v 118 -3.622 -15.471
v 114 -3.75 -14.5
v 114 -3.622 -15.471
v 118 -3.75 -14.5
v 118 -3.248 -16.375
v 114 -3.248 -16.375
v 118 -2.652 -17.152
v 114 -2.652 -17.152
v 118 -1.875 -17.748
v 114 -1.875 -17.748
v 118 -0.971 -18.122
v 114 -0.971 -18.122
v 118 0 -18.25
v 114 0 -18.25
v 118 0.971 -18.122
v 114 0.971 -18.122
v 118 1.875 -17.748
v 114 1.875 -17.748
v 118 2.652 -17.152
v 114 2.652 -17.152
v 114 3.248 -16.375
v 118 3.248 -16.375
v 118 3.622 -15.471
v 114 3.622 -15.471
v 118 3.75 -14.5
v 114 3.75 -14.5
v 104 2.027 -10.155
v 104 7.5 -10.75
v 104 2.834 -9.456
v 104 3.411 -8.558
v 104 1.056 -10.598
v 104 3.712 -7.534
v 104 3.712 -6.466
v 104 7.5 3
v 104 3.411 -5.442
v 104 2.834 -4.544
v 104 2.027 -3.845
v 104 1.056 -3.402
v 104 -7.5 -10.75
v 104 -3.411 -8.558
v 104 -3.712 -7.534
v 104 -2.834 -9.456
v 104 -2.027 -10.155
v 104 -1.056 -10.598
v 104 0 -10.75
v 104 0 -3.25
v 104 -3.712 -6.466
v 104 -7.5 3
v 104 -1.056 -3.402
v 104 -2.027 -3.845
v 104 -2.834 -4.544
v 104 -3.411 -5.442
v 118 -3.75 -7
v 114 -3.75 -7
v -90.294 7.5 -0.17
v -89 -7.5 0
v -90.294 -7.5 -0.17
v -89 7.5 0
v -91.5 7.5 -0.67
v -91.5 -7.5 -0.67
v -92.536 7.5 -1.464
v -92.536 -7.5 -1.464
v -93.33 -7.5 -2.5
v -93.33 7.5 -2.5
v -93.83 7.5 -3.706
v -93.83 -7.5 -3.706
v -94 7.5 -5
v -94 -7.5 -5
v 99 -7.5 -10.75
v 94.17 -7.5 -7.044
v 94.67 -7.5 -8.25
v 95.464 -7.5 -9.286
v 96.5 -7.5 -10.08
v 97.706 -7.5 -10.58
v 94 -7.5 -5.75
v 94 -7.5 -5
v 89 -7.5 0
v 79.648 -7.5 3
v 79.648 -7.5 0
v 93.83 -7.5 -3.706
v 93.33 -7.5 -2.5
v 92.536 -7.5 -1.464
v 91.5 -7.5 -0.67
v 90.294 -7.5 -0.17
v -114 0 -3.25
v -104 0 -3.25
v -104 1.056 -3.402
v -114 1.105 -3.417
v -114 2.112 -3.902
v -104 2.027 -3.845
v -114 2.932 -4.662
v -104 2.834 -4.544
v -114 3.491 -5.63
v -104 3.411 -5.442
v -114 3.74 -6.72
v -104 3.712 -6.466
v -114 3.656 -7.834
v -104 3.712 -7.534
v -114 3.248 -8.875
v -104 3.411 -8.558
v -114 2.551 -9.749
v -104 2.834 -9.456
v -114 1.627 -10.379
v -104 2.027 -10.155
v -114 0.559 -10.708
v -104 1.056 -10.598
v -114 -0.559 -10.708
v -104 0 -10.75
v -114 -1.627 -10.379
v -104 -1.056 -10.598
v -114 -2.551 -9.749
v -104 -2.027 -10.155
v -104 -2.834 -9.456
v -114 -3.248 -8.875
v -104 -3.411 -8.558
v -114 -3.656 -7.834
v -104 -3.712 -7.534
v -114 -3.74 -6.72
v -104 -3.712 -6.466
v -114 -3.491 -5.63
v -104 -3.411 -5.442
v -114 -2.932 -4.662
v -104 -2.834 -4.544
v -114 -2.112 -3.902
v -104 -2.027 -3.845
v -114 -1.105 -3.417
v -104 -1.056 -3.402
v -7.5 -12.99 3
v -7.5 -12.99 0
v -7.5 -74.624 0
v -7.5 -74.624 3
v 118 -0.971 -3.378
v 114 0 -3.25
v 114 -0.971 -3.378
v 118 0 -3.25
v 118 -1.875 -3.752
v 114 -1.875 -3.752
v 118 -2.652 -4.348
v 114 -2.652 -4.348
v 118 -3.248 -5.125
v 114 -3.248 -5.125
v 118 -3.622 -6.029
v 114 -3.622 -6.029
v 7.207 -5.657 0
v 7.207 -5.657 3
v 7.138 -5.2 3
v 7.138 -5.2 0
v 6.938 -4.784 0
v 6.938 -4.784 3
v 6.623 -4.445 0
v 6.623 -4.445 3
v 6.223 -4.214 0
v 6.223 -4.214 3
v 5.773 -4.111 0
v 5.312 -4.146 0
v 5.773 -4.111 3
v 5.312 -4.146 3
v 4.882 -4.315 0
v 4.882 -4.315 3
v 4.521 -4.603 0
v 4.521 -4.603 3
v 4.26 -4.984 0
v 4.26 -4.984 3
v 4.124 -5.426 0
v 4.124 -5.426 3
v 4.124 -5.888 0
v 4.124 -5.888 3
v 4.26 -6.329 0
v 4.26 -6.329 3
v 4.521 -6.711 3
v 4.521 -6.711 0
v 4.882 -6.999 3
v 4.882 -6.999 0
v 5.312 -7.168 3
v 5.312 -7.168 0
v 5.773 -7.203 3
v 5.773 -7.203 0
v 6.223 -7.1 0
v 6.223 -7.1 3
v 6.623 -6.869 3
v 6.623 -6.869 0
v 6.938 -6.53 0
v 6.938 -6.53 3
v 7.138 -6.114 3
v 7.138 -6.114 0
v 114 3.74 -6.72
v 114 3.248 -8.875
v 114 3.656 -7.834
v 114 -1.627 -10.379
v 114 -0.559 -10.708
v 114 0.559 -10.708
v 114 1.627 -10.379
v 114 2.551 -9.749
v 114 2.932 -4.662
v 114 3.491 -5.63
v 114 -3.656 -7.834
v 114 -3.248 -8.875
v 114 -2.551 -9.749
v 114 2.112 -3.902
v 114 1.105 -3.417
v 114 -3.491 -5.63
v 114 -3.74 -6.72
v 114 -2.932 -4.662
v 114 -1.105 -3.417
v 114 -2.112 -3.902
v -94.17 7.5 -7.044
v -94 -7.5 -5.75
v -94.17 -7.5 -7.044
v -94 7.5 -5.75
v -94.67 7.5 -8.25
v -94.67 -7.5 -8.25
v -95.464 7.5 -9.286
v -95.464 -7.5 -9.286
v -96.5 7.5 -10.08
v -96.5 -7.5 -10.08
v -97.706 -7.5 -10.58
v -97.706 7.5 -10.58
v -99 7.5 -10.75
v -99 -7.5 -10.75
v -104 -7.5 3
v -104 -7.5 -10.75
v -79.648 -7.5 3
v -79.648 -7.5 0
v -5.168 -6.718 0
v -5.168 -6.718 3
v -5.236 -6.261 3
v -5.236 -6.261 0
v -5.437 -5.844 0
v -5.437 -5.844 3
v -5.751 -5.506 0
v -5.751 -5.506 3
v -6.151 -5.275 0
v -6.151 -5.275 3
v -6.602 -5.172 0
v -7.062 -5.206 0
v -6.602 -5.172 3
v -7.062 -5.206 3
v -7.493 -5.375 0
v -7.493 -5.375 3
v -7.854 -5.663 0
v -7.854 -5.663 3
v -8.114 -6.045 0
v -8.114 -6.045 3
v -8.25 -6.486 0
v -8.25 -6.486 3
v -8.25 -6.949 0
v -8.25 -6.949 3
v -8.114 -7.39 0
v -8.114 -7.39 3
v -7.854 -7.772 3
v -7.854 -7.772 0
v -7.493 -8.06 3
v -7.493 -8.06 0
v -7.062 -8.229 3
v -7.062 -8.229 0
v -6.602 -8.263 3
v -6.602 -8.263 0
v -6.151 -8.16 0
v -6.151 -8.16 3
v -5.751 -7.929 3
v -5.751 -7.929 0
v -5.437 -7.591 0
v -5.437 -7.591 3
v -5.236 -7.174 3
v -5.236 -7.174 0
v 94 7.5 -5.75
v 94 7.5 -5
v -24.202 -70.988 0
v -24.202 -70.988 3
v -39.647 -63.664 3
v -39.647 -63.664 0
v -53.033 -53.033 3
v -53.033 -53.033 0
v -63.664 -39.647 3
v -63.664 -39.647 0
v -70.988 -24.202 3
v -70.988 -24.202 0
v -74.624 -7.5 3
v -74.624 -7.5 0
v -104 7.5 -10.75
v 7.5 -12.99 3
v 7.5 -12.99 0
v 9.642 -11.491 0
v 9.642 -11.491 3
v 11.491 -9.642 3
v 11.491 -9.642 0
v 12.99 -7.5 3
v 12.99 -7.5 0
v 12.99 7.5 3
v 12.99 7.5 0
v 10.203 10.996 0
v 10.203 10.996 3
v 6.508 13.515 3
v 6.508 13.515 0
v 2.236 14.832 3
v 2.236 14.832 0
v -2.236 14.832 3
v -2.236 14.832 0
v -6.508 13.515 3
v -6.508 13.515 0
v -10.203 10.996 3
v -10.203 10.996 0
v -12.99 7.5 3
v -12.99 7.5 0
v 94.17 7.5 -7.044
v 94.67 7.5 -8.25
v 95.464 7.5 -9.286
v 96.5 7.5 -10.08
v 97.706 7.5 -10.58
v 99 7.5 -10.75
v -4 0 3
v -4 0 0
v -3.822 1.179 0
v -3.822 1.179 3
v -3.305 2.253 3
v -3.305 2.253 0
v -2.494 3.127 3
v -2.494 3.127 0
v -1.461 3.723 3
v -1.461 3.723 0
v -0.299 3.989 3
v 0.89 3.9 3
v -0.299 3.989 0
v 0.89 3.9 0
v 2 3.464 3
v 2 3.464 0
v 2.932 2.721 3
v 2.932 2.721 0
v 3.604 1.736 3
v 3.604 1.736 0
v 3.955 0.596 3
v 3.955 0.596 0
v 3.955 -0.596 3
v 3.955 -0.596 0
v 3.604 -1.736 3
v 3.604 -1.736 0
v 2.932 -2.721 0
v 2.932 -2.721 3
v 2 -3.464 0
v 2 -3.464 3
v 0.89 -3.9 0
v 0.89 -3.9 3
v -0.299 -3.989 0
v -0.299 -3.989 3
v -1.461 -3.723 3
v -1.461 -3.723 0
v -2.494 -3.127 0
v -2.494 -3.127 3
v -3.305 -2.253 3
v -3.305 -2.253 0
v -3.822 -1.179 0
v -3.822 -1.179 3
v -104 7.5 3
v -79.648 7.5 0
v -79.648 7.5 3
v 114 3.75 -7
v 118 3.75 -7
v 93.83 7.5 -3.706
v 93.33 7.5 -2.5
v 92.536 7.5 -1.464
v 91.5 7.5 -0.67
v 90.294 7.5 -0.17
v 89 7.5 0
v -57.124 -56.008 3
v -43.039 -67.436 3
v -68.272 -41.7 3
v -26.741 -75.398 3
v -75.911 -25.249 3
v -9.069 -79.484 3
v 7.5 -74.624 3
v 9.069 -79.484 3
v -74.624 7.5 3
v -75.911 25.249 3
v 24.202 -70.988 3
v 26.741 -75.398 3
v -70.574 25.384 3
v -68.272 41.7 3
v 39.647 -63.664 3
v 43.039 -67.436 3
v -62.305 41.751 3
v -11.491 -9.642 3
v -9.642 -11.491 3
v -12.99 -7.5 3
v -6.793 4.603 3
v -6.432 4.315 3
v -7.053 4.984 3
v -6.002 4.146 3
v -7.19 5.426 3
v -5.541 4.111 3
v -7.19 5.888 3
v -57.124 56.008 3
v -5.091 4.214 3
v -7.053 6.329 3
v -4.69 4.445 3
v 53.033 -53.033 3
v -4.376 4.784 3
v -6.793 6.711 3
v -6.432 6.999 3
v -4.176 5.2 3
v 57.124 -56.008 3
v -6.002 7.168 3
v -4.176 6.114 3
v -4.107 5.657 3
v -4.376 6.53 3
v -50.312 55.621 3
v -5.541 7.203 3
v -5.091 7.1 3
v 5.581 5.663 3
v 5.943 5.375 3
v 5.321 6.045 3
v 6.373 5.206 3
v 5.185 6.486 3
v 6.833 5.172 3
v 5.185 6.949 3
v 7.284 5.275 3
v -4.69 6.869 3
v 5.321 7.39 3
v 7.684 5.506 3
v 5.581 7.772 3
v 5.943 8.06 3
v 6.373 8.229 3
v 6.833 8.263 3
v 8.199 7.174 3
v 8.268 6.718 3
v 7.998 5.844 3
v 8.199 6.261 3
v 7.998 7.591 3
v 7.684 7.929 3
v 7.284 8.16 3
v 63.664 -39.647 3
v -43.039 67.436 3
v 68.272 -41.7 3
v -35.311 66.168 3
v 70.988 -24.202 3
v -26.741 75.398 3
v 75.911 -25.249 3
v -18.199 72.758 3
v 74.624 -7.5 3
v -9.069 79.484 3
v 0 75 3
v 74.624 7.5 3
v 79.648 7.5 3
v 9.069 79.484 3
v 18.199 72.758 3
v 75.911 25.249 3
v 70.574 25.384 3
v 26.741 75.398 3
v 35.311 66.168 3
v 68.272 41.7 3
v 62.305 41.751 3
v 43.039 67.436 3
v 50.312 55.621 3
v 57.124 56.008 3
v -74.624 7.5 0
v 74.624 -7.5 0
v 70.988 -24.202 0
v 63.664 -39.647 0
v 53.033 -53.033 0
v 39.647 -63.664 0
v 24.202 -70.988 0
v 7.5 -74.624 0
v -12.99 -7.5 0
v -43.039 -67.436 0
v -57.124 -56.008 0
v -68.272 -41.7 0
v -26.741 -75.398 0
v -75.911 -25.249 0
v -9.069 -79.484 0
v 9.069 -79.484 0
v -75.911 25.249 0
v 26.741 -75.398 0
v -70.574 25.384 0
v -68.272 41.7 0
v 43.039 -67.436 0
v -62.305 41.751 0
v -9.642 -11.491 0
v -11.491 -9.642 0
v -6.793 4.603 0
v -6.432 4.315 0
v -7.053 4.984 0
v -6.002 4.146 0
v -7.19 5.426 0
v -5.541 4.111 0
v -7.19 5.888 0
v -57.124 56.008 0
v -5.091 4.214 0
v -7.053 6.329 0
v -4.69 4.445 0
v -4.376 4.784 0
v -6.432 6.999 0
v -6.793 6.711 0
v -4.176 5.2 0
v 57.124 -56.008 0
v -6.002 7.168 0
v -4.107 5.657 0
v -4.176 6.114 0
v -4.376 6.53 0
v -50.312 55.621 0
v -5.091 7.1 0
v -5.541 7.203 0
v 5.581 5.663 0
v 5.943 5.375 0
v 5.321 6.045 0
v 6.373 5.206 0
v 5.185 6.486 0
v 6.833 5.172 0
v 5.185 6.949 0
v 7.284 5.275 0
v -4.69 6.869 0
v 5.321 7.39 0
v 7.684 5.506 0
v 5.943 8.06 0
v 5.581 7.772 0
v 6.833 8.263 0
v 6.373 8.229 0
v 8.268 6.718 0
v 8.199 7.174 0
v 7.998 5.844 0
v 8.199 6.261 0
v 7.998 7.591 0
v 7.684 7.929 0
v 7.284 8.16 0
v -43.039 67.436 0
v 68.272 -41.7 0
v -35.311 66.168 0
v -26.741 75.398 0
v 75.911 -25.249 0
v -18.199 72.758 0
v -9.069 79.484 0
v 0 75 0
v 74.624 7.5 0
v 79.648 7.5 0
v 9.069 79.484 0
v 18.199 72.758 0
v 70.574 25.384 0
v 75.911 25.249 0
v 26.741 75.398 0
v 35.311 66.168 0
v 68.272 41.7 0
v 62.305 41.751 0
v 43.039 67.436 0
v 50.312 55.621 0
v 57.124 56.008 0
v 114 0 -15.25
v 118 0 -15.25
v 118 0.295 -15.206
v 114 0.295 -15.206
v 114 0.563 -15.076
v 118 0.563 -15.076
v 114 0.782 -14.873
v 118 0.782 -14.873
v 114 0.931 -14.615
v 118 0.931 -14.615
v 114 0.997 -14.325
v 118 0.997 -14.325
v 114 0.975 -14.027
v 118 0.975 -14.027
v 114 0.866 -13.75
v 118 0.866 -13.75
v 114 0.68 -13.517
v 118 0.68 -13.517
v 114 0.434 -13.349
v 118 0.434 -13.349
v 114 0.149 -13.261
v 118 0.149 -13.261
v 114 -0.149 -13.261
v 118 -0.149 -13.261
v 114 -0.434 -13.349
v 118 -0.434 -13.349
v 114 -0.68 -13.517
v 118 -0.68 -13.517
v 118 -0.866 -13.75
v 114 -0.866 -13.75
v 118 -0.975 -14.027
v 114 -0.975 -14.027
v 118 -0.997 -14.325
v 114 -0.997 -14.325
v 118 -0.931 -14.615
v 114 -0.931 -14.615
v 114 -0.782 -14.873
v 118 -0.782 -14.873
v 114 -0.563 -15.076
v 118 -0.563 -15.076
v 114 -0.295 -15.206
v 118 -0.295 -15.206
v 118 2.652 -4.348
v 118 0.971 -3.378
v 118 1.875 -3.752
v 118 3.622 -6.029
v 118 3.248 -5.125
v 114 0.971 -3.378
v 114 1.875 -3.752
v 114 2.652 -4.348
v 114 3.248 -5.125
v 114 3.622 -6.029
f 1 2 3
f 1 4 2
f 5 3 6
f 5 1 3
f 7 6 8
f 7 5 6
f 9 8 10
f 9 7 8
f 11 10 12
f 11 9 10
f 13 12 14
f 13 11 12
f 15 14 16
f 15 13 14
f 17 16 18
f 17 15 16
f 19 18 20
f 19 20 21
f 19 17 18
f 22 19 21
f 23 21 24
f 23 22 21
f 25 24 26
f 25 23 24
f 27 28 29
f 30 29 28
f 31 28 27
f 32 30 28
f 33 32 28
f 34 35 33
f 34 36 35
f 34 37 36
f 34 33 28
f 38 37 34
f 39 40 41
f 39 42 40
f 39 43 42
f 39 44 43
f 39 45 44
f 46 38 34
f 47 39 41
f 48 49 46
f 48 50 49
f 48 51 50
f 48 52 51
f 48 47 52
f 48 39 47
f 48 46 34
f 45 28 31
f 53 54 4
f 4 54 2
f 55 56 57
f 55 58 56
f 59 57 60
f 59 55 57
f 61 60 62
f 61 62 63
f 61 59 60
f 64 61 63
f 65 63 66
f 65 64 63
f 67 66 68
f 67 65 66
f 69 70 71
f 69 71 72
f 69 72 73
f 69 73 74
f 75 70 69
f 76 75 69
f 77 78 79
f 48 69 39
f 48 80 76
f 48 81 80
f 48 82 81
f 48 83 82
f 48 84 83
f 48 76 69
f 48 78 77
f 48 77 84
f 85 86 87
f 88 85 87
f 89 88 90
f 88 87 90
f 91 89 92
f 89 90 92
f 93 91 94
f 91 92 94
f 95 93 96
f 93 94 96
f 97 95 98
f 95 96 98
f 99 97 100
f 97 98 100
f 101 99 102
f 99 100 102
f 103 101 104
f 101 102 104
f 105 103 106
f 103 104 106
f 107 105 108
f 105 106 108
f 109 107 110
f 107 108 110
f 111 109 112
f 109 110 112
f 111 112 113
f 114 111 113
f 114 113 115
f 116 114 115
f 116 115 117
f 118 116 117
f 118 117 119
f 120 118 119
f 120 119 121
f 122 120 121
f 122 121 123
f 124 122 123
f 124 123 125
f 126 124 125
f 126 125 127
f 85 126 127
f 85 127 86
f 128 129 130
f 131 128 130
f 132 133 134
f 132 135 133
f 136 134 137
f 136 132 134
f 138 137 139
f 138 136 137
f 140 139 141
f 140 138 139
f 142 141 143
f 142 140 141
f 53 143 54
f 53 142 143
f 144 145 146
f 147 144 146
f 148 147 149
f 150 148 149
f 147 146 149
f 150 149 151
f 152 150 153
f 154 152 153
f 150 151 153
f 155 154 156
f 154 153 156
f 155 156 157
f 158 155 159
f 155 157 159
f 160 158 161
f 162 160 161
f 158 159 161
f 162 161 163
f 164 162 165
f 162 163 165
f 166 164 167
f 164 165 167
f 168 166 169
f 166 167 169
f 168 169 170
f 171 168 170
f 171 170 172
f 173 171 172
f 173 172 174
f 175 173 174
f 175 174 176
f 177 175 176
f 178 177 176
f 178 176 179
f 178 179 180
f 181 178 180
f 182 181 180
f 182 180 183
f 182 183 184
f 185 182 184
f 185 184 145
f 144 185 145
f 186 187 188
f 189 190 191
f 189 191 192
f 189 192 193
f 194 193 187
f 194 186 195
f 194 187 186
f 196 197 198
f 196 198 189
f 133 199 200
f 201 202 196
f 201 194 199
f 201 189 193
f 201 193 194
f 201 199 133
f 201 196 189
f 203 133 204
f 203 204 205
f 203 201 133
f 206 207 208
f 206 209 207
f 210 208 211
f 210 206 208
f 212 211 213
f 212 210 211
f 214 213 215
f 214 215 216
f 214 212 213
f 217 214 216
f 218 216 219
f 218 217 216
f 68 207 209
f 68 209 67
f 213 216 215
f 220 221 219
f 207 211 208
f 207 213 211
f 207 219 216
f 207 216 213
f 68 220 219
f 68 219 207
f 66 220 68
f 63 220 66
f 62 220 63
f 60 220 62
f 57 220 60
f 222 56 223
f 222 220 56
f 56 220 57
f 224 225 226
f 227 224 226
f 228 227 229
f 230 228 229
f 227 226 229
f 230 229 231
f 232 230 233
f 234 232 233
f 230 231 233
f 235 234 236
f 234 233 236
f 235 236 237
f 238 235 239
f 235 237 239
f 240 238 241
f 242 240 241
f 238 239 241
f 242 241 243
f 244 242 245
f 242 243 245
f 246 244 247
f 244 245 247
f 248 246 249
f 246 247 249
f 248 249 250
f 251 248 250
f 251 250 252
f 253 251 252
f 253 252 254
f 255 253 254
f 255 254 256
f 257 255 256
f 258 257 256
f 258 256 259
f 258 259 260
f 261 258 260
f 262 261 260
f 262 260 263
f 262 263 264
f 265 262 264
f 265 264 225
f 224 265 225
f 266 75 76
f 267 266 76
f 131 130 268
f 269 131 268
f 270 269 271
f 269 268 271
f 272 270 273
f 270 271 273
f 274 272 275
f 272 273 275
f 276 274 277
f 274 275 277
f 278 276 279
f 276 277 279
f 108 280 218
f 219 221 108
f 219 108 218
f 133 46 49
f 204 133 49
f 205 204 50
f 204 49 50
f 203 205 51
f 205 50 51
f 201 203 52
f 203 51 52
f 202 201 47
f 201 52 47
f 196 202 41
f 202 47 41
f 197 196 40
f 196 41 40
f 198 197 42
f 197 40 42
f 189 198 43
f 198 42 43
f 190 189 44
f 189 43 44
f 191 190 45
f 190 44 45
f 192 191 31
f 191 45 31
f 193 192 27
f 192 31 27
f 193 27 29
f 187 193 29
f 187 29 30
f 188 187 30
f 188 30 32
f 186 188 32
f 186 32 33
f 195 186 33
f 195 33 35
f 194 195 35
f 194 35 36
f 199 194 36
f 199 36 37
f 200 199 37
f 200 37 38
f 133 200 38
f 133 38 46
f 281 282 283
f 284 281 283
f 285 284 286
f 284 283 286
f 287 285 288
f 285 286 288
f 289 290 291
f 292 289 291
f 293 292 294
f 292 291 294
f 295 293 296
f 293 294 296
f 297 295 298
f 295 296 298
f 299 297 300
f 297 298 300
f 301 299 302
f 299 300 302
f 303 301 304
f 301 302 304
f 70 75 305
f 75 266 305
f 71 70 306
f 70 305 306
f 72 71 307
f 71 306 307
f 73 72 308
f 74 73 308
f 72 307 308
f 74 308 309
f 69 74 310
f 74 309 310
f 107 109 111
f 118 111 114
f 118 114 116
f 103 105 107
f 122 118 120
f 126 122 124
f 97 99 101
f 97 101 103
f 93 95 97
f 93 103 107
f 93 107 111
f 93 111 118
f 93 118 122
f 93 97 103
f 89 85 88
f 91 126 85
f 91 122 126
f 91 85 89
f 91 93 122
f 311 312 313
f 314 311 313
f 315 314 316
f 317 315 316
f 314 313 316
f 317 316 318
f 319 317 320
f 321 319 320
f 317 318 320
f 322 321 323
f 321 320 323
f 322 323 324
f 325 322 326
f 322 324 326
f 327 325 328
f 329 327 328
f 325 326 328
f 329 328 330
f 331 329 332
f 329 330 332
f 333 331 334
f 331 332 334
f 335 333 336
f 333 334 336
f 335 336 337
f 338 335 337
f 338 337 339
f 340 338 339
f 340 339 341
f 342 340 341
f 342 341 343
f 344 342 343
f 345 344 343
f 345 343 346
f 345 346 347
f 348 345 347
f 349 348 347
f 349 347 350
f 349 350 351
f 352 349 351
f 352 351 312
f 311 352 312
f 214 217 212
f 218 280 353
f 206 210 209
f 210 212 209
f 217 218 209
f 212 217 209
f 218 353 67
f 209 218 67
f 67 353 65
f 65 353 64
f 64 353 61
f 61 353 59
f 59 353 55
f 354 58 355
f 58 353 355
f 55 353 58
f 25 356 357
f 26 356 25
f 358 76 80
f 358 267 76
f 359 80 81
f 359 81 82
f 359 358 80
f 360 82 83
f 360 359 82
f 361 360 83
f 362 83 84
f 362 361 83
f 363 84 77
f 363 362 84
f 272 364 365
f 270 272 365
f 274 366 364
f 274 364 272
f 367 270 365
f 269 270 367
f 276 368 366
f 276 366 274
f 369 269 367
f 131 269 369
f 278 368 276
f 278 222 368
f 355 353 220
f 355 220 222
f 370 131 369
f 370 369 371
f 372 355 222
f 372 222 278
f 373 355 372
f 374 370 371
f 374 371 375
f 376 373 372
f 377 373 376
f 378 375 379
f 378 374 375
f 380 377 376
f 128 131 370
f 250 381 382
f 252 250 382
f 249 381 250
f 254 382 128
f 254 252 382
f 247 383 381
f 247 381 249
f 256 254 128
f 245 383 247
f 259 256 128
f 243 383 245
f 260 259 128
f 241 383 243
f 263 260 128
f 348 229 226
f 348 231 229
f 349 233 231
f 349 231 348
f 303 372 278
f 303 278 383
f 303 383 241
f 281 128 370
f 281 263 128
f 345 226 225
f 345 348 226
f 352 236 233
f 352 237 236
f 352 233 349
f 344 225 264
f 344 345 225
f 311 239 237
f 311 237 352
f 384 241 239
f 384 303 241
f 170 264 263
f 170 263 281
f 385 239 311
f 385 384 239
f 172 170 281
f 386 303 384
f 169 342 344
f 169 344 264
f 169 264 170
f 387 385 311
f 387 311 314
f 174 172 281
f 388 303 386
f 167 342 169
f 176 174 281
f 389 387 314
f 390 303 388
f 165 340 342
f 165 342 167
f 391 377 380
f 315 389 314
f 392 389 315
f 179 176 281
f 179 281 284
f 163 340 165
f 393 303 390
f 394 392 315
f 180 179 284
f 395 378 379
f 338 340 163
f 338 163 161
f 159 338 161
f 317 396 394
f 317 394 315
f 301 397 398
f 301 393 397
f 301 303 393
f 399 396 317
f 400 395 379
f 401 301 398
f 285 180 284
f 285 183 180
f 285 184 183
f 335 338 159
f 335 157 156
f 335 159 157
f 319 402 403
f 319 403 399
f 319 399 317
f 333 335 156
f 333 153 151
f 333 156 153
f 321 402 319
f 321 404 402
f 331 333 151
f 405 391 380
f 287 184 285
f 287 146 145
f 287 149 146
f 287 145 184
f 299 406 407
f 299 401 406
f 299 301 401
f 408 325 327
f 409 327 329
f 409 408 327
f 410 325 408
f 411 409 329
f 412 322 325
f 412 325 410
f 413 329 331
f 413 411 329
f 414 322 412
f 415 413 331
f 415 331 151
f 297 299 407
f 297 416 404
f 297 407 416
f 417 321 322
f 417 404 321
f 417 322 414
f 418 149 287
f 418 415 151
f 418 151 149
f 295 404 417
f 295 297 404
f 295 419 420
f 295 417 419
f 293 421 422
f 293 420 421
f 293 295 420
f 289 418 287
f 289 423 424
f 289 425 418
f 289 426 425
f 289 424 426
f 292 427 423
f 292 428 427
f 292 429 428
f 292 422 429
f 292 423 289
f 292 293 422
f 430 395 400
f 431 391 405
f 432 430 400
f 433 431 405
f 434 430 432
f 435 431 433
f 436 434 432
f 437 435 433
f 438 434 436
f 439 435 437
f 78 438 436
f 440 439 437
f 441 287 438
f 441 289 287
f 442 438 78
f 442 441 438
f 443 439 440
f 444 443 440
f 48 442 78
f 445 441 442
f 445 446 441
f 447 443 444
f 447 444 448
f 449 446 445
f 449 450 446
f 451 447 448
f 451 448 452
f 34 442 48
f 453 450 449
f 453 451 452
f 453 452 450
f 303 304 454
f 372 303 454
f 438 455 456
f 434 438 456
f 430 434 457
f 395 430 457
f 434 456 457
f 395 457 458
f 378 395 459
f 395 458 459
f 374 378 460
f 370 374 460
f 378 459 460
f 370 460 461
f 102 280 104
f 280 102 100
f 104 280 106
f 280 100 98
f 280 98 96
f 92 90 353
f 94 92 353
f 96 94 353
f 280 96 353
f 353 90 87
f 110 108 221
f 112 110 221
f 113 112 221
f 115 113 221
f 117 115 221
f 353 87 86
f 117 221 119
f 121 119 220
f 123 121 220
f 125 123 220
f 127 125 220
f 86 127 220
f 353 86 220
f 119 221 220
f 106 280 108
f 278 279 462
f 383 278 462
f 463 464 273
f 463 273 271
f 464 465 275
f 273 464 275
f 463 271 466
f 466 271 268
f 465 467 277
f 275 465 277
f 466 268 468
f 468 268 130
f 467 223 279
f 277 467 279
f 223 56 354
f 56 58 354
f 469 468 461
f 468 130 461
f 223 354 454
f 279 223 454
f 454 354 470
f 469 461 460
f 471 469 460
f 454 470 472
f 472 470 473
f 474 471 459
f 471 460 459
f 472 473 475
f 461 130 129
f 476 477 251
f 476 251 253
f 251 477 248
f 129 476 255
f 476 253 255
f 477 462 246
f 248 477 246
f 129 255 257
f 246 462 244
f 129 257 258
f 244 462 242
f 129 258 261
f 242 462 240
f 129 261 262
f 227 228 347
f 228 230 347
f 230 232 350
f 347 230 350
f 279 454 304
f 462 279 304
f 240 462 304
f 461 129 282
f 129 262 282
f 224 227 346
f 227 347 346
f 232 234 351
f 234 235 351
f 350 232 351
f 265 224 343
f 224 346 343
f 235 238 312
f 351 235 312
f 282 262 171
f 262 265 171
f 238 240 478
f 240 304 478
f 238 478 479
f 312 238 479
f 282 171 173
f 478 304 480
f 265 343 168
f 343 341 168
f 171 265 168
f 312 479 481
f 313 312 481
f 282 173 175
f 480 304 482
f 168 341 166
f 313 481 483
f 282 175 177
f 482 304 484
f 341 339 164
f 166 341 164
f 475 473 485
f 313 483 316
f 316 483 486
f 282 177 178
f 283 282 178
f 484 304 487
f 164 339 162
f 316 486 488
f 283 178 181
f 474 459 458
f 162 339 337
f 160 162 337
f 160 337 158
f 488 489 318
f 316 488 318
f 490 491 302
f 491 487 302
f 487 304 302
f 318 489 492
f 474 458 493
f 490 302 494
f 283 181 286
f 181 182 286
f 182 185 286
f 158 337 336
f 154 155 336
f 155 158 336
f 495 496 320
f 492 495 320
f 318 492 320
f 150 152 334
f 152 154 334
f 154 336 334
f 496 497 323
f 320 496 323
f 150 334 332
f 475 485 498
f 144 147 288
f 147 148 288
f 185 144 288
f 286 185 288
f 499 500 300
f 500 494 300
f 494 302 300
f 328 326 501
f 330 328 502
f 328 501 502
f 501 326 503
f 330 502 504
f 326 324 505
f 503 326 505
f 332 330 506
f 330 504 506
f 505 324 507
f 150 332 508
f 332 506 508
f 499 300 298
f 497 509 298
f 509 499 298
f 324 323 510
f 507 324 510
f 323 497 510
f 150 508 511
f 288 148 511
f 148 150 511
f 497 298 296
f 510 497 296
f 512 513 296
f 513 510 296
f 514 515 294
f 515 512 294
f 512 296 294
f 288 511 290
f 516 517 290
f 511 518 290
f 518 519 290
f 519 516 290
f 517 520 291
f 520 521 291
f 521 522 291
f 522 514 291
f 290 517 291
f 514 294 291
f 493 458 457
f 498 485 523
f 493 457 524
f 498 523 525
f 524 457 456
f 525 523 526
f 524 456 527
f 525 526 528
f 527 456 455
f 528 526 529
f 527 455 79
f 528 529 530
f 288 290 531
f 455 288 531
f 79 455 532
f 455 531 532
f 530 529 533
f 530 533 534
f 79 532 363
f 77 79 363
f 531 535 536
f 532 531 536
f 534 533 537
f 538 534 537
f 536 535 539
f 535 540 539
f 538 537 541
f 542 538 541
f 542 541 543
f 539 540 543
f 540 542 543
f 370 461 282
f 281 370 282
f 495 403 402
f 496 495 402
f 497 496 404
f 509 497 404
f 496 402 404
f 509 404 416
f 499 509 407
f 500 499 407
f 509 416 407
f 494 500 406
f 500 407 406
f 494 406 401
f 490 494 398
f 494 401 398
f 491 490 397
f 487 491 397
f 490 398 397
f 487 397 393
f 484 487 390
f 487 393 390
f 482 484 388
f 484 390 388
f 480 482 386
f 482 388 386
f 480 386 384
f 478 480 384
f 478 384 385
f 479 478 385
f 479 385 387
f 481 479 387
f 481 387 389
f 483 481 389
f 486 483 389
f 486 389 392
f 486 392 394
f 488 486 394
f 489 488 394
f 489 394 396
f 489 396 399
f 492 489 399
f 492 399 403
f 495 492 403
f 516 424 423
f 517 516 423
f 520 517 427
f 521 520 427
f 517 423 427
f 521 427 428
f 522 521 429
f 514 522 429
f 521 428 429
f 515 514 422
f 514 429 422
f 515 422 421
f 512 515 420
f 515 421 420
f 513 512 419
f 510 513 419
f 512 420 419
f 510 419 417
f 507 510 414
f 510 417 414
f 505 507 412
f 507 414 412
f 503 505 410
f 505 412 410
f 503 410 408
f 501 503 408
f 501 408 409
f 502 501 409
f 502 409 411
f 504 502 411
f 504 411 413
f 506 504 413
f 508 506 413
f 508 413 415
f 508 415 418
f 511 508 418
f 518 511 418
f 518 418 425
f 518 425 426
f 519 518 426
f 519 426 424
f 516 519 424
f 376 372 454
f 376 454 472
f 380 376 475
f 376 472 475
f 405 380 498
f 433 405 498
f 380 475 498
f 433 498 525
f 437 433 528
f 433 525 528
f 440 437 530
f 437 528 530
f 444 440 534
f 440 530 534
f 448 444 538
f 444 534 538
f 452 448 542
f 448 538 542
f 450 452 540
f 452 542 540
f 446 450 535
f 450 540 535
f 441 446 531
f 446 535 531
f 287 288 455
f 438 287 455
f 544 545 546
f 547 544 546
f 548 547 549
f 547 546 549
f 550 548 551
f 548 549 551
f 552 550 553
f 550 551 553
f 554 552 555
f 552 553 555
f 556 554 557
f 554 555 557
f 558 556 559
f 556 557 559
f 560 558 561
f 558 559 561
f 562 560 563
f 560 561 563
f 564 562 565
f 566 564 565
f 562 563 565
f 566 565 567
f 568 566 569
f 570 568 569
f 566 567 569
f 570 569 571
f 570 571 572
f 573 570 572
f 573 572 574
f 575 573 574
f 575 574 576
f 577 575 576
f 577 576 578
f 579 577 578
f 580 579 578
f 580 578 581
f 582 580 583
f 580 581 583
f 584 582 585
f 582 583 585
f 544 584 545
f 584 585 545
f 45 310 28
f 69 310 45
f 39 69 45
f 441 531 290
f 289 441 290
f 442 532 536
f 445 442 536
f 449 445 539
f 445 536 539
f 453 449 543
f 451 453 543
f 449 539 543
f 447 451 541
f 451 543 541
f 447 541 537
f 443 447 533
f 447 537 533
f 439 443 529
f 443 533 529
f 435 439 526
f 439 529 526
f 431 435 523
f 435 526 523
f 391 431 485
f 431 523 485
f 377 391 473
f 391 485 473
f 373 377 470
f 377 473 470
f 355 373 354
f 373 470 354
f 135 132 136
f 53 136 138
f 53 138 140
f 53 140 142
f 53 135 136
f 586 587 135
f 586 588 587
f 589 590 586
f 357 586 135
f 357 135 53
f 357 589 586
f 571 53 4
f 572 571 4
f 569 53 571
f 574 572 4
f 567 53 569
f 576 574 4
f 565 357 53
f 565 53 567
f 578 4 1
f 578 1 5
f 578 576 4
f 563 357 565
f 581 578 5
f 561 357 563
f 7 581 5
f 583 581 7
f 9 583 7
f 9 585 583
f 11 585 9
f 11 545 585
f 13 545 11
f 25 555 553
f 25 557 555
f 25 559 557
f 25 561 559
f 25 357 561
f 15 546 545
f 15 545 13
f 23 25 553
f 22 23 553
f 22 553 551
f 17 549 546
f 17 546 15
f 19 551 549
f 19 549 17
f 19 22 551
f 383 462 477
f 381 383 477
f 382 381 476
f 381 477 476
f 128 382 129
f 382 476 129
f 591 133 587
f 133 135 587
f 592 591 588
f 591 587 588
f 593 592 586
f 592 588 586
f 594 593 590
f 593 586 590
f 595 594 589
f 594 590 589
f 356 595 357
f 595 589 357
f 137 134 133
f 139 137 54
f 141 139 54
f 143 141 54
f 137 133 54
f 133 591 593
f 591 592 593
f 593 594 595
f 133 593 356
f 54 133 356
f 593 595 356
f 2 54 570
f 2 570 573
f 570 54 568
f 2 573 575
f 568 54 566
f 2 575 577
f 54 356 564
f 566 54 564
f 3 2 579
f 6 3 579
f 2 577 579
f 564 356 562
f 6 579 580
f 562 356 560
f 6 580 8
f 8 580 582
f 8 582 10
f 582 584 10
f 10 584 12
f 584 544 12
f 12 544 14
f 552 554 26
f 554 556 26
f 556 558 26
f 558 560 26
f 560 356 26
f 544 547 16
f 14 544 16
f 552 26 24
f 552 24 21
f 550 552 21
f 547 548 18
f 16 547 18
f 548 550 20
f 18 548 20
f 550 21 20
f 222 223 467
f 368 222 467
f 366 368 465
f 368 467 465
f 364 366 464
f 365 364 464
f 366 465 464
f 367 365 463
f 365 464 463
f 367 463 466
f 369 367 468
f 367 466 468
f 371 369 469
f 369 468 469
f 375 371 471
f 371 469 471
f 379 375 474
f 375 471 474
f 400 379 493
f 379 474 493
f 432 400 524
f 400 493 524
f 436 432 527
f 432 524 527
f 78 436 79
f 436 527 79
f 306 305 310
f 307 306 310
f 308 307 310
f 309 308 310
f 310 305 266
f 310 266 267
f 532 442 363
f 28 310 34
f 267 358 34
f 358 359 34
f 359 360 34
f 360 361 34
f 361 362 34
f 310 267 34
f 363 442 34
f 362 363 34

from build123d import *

# Parameters (mm, degrees)
BOSS_EXTRUDE1_DEPTH = 3
SKETCH1_3_R         = 15
BOSS_EXTRUDE2_DEPTH = 3
SKETCH2_R           = 1.55
CUT_EXTRUDE1_DEPTH  = 5
SKETCH4_R           = 3.75
BOSS_EXTRUDE3_DEPTH = 10
SKETCH3_R           = 3.75
BOSS_EXTRUDE4_DEPTH = 10
SKETCH5_W           = 15
SKETCH5_H           = 7.5
BOSS_EXTRUDE5_DEPTH = 4
FILLET2_R           = 3.75
SKETCH8_W           = 10
SKETCH8_H           = 10.75
BOSS_EXTRUDE7_DEPTH = 15
FILLET4_R           = 5
SKETCH7_W           = 10
SKETCH7_H           = 10.75
BOSS_EXTRUDE6_DEPTH = 15
FILLET3_R           = 5
SKETCH6_R           = 1
CUT_EXTRUDE4_DEPTH  = 4
SKETCH9_R           = 4
CUT_EXTRUDE5_DEPTH  = 4


with BuildPart() as part:
    # Sketch1 → Boss-Extrude1 (new body)
    with BuildSketch(Plane.XY):
        with BuildLine():
            Line((104, 7.5), (79.64766161, 7.5))
            ThreePointArc((79.64766161, 7.5), (0, 80), (-79.64766161, 7.5))
            Line((-79.64766161, 7.5), (-104, 7.5))
            Line((-104, 7.5), (-104, -7.5))
            Line((-104, -7.5), (-79.64766161, -7.5))
            ThreePointArc((-79.64766161, -7.5), (0, -80), (79.64766161, -7.5))
            Line((79.64766161, -7.5), (104, -7.5))
            Line((104, -7.5), (104, 7.5))
        make_face()
        with BuildLine():
            ThreePointArc((75, 0), (74.905955483, -3.754708129), (74.624057783, -7.5))
            ThreePointArc((74.624057783, -7.5), (53.033008589, -53.033008589), (7.5, -74.624057783))
            ThreePointArc((7.5, -74.624057783), (0, -75), (-7.5, -74.624057783))
            ThreePointArc((-7.5, -74.624057783), (-53.033008589, -53.033008589), (-74.624057783, -7.5))
            ThreePointArc((-74.624057783, -7.5), (-75, 0), (-74.624057783, 7.5))
            ThreePointArc((-74.624057783, 7.5), (0, 75), (74.624057783, 7.5))
            ThreePointArc((74.624057783, 7.5), (74.905955483, 3.754708129), (75, 0))
        make_face(mode=Mode.SUBTRACT)
    extrude(amount=BOSS_EXTRUDE1_DEPTH)

    # Sketch1<3> → Boss-Extrude2 (add)
    with BuildSketch(Plane.XY):
        with BuildLine():
            Line((-74.624057783, -7.5), (-12.990381057, -7.5))
            ThreePointArc((-12.990381057, -7.5), (-15, 0), (-12.990381057, 7.5))
            Line((-12.990381057, 7.5), (-74.624057783, 7.5))
            ThreePointArc((-74.624057783, 7.5), (-75, 0), (-74.624057783, -7.5))
        make_face()
        Circle(SKETCH1_3_R)
        with BuildLine():
            Line((7.5, -74.624057783), (7.5, -12.990381057))
            ThreePointArc((7.5, -12.990381057), (0, -15), (-7.5, -12.990381057))
            Line((-7.5, -12.990381057), (-7.5, -74.624057783))
            ThreePointArc((-7.5, -74.624057783), (0, -75), (7.5, -74.624057783))
        make_face()
        with BuildLine():
            ThreePointArc((15, 0), (14.488887394, -3.882285677), (12.990381057, -7.5))
            Line((12.990381057, -7.5), (74.624057783, -7.5))
            ThreePointArc((74.624057783, -7.5), (74.905955483, -3.754708129), (75, 0))
            ThreePointArc((75, 0), (74.905955483, 3.754708129), (74.624057783, 7.5))
            Line((74.624057783, 7.5), (12.990381057, 7.5))
            ThreePointArc((12.990381057, 7.5), (14.488887394, 3.882285677), (15, 0))
        make_face()
    extrude(amount=BOSS_EXTRUDE2_DEPTH)

    # Sketch2 → Cut-Extrude1 (cut)
    with BuildSketch(Plane.XY.offset(3)):
        with Locations((-5.656854249, 5.656854249)):
            Circle(SKETCH2_R)
        with Locations((6.717514421, 6.717514421)):
            Circle(SKETCH2_R)
        with Locations((5.656854249, -5.656854249)):
            Circle(SKETCH2_R)
        with Locations((-6.717514421, -6.717514421)):
            Circle(SKETCH2_R)
    extrude(amount=-CUT_EXTRUDE1_DEPTH, mode=Mode.SUBTRACT)



with BuildPart() as body_2:
    # Sketch4 → Boss-Extrude3 (new body)
    with BuildSketch(Plane.ZY.offset(104)):
        with Locations((-7, 0)):
            Circle(SKETCH4_R)
    extrude(amount=BOSS_EXTRUDE3_DEPTH)


with BuildPart() as body_3:
    # Sketch3 → Boss-Extrude4 (new body)
    with BuildSketch(Plane(origin=(104, 0, 0), x_dir=(0, 0, -1), z_dir=(1, 0, 0))):
        with Locations(Location((7, 0, 0), (0, 0, 180))):
            Circle(SKETCH3_R)
    extrude(amount=BOSS_EXTRUDE4_DEPTH)


with BuildPart() as body_4:
    # Sketch5 → Boss-Extrude5 (new body)
    with BuildSketch(Plane(origin=(114, 0, 0), x_dir=(0, 0, -1), z_dir=(1, 0, 0))):
        with Locations((10.75, 0)):
            Rectangle(SKETCH5_W, SKETCH5_H)
    extrude(amount=BOSS_EXTRUDE5_DEPTH)

    # Fillet2
    fillet2_edges = [body_4.edges().sort_by_distance(p)[0] for p in [
        (116, -3.75, -3.25),
        (116, 3.75, -3.25),
        (116, 3.75, -18.25),
        (116, -3.75, -18.25),
    ]]
    fillet(fillet2_edges, radius=FILLET2_R - 0.0001)  # a hair under: the kernel refuses the full size

    # Sketch6 → Cut-Extrude4 (cut)
    with BuildSketch(Plane(origin=(118, 0, 0), x_dir=(0, 0, -1), z_dir=(1, 0, 0))):
        with Locations((14.25, 0)):
            Circle(SKETCH6_R)
    extrude(amount=-CUT_EXTRUDE4_DEPTH, mode=Mode.SUBTRACT)


with BuildPart() as part_1:
    add(part.part)

    add(body_3.part)  # Boss-Extrude7 merges body 3
    # Sketch8 → Boss-Extrude7 (add)
    with BuildSketch(Plane.XZ.offset(7.5)):
        with Locations((99, -5.375)):
            Rectangle(SKETCH8_W, SKETCH8_H)
    extrude(amount=-BOSS_EXTRUDE7_DEPTH)

    # Fillet4
    fillet4_edges = [part_1.edges().sort_by_distance(p)[0] for p in [
        (94, 0, 0),
        (94, 0, -10.75),
    ]]
    fillet(fillet4_edges, radius=FILLET4_R)


    add(body_2.part)  # Boss-Extrude6 merges body 2
    # Sketch7 → Boss-Extrude6 (add)
    with BuildSketch(Plane.XZ.offset(7.5)):
        with Locations((-99, -5.375)):
            Rectangle(SKETCH7_W, SKETCH7_H)
    extrude(amount=-BOSS_EXTRUDE6_DEPTH)

    # Fillet3
    fillet3_edges = [part_1.edges().sort_by_distance(p)[0] for p in [
        (-94, 0, 0),
        (-94, 0, -10.75),
    ]]
    fillet(fillet3_edges, radius=FILLET3_R)

    # Sketch9 → Cut-Extrude5 (cut)
    with BuildSketch(Plane(origin=(0, 0, 0), x_dir=(-1, 0, 0), z_dir=(0, 0, -1))):
        Circle(SKETCH9_R)
    extrude(amount=-CUT_EXTRUDE5_DEPTH, mode=Mode.SUBTRACT)


solid = Compound([body_4.part, part_1.part])
